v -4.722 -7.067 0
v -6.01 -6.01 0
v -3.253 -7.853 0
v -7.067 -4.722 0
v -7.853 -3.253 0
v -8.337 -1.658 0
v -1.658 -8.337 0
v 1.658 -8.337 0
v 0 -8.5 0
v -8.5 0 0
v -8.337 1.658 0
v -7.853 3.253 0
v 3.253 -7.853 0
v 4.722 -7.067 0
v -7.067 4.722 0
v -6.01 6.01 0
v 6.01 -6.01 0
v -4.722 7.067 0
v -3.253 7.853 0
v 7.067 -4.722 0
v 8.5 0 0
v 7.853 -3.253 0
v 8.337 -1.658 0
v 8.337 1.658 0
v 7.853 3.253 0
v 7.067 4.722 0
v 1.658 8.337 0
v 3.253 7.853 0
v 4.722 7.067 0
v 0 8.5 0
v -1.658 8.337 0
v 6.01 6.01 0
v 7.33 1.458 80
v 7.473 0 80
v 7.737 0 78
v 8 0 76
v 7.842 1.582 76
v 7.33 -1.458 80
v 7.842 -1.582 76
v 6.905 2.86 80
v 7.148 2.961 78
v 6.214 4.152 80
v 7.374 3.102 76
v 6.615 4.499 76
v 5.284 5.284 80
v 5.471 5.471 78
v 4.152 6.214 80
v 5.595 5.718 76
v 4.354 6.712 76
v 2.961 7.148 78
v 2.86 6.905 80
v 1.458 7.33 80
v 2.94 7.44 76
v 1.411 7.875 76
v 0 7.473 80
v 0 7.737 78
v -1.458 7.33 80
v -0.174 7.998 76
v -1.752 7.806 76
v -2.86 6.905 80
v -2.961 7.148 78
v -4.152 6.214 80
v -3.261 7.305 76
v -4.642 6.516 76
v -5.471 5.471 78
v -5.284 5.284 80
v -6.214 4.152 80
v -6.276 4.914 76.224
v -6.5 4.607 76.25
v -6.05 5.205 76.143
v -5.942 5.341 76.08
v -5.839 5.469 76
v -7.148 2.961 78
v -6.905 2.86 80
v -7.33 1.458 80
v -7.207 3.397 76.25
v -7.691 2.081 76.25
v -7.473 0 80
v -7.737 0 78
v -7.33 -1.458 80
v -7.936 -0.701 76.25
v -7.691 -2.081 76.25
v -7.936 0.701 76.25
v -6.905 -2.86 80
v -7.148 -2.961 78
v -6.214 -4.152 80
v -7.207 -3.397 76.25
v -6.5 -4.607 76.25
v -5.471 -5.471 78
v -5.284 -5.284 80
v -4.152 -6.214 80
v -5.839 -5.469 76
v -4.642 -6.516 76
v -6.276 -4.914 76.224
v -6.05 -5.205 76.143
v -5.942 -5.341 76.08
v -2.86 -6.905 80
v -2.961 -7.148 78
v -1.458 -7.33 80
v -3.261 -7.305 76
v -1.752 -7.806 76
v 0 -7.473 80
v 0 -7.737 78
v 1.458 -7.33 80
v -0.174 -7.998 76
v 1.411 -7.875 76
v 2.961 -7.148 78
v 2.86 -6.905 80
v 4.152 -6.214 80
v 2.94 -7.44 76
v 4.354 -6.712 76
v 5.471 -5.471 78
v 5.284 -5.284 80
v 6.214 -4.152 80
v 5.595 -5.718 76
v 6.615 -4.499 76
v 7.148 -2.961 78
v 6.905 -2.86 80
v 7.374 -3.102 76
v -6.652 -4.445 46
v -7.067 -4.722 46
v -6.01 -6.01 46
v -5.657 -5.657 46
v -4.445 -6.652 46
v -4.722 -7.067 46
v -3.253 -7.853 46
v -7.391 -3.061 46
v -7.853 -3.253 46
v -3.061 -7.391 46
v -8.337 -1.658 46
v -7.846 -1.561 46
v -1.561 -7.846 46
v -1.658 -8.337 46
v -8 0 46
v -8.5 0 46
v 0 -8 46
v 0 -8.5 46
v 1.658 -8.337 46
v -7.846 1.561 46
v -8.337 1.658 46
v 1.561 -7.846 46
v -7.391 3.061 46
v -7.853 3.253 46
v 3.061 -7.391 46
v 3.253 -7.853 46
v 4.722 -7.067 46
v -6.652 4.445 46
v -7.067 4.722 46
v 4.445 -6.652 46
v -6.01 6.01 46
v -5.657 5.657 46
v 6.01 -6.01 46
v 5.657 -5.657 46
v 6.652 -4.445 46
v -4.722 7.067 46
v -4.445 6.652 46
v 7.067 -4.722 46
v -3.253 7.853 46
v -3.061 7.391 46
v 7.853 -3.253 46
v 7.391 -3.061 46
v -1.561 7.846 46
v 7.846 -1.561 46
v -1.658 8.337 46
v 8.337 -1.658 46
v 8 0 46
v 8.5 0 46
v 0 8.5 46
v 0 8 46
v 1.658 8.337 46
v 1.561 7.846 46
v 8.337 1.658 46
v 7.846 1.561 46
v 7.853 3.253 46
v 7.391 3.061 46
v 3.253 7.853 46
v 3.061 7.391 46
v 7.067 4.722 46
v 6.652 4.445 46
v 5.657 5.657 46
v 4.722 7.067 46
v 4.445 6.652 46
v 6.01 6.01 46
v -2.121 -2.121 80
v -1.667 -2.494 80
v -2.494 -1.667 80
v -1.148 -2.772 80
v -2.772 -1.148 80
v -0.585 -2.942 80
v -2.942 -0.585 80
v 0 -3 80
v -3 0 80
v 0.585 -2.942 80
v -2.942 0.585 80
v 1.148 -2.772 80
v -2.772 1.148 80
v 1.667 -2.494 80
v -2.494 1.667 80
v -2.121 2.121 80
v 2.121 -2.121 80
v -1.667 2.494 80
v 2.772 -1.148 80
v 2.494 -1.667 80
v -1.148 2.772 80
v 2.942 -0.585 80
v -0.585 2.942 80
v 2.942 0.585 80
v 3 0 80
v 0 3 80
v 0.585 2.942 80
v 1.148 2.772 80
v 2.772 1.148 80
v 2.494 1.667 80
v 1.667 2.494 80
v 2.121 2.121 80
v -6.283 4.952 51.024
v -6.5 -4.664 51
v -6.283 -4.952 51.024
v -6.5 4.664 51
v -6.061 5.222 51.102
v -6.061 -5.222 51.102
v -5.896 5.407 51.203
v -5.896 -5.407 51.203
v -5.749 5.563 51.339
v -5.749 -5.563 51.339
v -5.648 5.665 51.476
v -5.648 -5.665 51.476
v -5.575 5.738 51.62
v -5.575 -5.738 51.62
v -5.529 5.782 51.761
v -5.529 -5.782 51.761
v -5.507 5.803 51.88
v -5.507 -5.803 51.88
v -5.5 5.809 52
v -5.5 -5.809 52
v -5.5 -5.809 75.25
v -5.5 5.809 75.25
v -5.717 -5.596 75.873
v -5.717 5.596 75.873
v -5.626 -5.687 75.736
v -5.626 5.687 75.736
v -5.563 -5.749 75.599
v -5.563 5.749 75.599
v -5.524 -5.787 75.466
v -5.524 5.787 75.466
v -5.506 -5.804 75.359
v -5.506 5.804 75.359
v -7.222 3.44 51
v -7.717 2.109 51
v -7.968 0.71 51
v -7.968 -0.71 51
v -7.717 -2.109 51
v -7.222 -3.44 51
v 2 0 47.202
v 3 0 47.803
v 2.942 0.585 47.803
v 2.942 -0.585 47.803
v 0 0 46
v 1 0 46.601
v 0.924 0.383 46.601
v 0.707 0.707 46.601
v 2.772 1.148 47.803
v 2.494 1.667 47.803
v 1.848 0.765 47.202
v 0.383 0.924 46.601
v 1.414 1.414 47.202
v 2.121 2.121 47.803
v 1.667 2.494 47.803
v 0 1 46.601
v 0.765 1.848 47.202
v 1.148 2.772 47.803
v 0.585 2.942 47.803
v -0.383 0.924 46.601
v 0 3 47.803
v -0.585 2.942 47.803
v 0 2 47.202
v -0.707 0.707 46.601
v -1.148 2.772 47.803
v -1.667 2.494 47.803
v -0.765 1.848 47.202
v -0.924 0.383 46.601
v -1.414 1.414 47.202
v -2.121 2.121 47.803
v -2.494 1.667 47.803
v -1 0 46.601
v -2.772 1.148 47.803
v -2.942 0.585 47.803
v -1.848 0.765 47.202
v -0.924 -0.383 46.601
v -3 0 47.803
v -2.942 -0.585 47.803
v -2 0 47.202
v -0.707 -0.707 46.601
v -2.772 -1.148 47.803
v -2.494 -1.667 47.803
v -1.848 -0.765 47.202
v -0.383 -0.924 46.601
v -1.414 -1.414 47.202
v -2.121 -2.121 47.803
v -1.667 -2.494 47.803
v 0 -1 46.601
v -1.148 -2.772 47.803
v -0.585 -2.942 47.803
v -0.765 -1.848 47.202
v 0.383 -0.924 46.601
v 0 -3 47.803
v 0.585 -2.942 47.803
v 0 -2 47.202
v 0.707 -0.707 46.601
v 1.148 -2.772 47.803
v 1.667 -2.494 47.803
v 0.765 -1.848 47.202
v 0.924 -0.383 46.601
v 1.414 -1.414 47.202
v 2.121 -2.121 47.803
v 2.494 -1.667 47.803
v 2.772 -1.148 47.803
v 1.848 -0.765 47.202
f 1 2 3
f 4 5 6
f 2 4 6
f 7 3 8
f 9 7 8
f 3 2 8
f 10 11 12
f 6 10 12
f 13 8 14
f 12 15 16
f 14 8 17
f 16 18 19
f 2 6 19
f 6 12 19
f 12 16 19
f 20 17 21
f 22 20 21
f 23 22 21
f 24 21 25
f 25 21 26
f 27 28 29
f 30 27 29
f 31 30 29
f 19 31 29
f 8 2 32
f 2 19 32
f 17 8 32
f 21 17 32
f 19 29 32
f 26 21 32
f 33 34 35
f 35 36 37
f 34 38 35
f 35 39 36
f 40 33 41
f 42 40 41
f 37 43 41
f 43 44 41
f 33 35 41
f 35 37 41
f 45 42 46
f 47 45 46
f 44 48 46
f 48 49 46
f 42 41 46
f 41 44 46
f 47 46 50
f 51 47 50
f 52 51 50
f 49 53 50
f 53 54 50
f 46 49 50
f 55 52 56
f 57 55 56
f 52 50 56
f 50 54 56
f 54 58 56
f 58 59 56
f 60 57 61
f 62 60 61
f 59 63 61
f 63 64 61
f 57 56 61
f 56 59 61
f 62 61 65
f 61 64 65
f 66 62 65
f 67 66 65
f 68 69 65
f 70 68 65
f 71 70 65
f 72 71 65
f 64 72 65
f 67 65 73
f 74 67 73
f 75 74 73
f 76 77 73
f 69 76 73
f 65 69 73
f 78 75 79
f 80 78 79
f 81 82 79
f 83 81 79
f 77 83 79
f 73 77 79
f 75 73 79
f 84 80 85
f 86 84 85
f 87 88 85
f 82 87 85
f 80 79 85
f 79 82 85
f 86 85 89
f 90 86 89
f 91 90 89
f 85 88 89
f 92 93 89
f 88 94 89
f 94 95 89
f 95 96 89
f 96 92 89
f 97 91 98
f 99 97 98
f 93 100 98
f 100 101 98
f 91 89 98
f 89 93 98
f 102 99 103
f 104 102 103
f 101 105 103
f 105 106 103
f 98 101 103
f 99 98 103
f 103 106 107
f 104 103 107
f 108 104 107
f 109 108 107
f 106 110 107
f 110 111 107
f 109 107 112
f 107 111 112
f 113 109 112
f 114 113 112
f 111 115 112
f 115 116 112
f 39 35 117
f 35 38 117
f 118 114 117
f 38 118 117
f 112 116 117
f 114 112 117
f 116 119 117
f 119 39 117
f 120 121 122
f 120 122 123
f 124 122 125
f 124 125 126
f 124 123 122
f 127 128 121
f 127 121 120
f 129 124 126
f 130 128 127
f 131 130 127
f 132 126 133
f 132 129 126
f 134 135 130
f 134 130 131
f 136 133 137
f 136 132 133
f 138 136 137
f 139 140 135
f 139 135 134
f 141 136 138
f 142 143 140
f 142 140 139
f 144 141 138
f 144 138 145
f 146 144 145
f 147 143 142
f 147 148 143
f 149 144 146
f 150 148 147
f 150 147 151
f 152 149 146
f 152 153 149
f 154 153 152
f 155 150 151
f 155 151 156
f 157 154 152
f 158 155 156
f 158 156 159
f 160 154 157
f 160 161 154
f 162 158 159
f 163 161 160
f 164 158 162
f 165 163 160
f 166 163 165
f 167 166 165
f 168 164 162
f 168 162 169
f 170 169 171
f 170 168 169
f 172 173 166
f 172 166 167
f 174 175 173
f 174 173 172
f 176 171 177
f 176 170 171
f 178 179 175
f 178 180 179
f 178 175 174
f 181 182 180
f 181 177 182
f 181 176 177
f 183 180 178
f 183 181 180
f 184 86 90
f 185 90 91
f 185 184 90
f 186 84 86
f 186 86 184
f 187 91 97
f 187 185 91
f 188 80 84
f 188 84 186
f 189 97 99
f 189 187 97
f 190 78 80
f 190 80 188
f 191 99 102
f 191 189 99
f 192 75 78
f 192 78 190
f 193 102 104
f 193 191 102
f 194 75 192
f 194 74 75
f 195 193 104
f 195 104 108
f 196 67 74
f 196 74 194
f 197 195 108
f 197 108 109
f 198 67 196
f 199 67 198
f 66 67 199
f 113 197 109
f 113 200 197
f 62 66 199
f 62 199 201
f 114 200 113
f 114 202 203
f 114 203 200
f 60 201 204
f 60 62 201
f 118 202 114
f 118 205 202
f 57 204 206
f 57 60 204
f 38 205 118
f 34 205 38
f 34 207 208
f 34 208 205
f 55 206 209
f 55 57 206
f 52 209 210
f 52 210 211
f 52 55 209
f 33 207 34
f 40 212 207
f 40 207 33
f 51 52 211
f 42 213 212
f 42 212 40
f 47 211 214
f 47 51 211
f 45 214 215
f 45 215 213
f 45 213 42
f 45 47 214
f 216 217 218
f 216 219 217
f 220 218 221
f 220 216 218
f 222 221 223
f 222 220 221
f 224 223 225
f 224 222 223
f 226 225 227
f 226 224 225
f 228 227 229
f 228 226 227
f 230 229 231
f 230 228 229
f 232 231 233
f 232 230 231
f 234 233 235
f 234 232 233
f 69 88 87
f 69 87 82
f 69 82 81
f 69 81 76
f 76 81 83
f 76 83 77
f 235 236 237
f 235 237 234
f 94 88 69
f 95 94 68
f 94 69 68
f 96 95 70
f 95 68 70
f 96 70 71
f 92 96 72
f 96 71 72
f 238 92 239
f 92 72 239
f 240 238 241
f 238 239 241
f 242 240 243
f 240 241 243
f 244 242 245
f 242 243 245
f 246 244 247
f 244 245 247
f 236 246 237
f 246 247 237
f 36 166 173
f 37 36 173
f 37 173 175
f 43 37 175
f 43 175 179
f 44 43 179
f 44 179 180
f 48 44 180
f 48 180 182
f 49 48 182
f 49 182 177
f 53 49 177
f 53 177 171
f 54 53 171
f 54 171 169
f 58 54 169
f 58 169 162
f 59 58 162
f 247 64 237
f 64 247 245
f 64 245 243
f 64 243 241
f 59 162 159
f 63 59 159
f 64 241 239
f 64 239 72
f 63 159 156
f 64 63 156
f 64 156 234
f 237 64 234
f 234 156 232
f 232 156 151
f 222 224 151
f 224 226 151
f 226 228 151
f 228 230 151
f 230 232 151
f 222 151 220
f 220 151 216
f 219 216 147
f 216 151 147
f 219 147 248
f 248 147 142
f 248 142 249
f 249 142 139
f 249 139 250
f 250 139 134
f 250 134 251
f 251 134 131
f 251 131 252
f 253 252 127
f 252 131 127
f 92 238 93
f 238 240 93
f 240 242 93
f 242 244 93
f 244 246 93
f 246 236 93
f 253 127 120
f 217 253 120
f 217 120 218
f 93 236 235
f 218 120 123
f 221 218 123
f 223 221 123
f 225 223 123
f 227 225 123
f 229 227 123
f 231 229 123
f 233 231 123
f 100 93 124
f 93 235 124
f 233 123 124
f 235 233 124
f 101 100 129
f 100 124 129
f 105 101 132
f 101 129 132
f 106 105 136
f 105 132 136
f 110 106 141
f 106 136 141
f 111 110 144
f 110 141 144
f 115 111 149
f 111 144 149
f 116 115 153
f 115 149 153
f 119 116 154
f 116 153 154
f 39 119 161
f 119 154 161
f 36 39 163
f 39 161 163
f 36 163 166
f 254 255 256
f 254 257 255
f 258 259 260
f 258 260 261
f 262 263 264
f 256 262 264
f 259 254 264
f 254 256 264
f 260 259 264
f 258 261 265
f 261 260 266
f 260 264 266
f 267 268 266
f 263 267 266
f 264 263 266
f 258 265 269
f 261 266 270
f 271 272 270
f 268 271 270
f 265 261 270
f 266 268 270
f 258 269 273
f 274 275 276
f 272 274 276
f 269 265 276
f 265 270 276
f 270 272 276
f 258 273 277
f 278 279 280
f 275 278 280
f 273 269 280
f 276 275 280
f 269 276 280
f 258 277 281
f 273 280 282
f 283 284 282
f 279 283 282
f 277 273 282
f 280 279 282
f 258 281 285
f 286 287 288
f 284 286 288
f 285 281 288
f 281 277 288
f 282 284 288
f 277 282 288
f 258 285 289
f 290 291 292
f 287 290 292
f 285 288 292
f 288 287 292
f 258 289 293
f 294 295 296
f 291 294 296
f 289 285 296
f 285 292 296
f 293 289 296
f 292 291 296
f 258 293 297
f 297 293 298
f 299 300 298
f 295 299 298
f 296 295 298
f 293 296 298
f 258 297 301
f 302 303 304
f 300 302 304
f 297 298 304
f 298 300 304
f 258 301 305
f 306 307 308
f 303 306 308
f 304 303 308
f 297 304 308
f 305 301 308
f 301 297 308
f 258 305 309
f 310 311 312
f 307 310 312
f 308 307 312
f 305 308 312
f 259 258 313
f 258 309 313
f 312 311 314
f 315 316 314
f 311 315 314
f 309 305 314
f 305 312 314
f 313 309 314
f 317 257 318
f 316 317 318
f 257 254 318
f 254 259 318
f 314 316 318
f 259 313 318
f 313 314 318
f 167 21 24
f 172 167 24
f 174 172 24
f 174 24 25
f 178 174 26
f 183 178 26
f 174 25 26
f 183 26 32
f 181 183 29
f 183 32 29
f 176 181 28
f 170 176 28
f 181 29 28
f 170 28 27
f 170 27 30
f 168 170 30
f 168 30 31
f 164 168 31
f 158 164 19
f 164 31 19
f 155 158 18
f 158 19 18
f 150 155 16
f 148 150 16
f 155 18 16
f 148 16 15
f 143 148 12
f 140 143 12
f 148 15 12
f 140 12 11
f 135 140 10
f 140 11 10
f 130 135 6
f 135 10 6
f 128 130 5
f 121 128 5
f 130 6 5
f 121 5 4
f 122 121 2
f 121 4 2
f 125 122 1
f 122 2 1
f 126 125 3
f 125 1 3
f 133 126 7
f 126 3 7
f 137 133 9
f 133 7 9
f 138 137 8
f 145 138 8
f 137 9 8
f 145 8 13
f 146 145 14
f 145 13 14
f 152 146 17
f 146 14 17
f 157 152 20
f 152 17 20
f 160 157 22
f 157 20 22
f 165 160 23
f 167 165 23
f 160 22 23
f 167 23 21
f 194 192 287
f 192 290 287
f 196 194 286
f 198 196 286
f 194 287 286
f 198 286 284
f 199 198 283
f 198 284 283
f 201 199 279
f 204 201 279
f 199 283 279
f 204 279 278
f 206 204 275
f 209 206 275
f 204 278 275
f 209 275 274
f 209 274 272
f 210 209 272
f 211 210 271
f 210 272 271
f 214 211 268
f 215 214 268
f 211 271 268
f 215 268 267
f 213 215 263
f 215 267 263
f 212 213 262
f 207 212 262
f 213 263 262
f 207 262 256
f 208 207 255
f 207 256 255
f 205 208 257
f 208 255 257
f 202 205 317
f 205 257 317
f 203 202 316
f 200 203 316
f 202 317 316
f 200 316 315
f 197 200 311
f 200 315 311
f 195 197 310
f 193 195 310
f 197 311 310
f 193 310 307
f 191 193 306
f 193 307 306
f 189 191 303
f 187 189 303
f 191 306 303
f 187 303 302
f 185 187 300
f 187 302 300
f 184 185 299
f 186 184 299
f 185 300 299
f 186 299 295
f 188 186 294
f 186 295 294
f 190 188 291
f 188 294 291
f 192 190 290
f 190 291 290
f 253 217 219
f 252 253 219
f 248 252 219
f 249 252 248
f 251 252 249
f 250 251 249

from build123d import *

# Parameters (mm, degrees)
SKETCH1_R                 = 8.5
BOSS_EXTRUDE1_DEPTH       = 46
SKETCH2_R                 = 8
BOSS_EXTRUDE2_DEPTH       = 34
CUT_EXTRUDE1_DEPTH        = 81.898084032
CUT_EXTRUDE1_DEPTH_BACK   = 81.898084032
SKETCH3_W                 = 2.5
SKETCH3_H                 = 25.25
FILLET1_R                 = 1
F_6_0MM_DOWEL_HOLE1_D     = 6
F_6_0MM_DOWEL_HOLE1_DEPTH = 32.197418143
F_6_0MM_DOWEL_HOLE1_TIP   = 1.802581857


with BuildPart() as part:
    # Sketch1 → Boss-Extrude1 (new body)
    with BuildSketch(Plane.XY):
        Circle(SKETCH1_R)
    extrude(amount=BOSS_EXTRUDE1_DEPTH)

    # Sketch2 → Boss-Extrude2 (add)
    with BuildSketch(Plane.XY.offset(46)):
        Circle(SKETCH2_R)
    extrude(amount=BOSS_EXTRUDE2_DEPTH)

    # Sketch3 → Cut-Extrude1 (cut, two sides: drawn at the far end of the back side and taken through both)
    with BuildSketch(Plane(origin=(0, 0, 0), x_dir=(1, 0, 0), z_dir=(0, 1, 0)).offset(-CUT_EXTRUDE1_DEPTH_BACK)):
        with Locations((-6.75, -63.625)):
            Rectangle(SKETCH3_W, SKETCH3_H)
    extrude(amount=CUT_EXTRUDE1_DEPTH + CUT_EXTRUDE1_DEPTH_BACK, mode=Mode.SUBTRACT)

    # Fillet1
    fillet1_edges = [part.edges().sort_by_distance(p)[0] for p in [
        (-5.5, 0, 51),
        (-5.5, 0, 76.25),
    ]]
    fillet(fillet1_edges, radius=FILLET1_R)

    # Chamfer1: read off the stored shape, not the designer's step
    # Chamfer1 outline → Chamfer1 (revolve, cut)
    with BuildSketch(Plane.XZ):
        Polygon((8, 80), (7.47339001, 80), (8, 76), align=None)
    revolve(axis=Axis((0, 0, 0), (0, 0, 1)), mode=Mode.SUBTRACT)

    # Ø6.0mm Dowel Hole1
    with Locations(Plane.XY.offset(80)):
        with Locations((0, 0)):
            Hole(F_6_0MM_DOWEL_HOLE1_D / 2, depth=F_6_0MM_DOWEL_HOLE1_DEPTH)
            with Locations((0, 0, -(F_6_0MM_DOWEL_HOLE1_DEPTH + F_6_0MM_DOWEL_HOLE1_TIP / 2))):  # 118° drill point
                Cone(0, F_6_0MM_DOWEL_HOLE1_D / 2, F_6_0MM_DOWEL_HOLE1_TIP, mode=Mode.SUBTRACT)


solid = part.part
